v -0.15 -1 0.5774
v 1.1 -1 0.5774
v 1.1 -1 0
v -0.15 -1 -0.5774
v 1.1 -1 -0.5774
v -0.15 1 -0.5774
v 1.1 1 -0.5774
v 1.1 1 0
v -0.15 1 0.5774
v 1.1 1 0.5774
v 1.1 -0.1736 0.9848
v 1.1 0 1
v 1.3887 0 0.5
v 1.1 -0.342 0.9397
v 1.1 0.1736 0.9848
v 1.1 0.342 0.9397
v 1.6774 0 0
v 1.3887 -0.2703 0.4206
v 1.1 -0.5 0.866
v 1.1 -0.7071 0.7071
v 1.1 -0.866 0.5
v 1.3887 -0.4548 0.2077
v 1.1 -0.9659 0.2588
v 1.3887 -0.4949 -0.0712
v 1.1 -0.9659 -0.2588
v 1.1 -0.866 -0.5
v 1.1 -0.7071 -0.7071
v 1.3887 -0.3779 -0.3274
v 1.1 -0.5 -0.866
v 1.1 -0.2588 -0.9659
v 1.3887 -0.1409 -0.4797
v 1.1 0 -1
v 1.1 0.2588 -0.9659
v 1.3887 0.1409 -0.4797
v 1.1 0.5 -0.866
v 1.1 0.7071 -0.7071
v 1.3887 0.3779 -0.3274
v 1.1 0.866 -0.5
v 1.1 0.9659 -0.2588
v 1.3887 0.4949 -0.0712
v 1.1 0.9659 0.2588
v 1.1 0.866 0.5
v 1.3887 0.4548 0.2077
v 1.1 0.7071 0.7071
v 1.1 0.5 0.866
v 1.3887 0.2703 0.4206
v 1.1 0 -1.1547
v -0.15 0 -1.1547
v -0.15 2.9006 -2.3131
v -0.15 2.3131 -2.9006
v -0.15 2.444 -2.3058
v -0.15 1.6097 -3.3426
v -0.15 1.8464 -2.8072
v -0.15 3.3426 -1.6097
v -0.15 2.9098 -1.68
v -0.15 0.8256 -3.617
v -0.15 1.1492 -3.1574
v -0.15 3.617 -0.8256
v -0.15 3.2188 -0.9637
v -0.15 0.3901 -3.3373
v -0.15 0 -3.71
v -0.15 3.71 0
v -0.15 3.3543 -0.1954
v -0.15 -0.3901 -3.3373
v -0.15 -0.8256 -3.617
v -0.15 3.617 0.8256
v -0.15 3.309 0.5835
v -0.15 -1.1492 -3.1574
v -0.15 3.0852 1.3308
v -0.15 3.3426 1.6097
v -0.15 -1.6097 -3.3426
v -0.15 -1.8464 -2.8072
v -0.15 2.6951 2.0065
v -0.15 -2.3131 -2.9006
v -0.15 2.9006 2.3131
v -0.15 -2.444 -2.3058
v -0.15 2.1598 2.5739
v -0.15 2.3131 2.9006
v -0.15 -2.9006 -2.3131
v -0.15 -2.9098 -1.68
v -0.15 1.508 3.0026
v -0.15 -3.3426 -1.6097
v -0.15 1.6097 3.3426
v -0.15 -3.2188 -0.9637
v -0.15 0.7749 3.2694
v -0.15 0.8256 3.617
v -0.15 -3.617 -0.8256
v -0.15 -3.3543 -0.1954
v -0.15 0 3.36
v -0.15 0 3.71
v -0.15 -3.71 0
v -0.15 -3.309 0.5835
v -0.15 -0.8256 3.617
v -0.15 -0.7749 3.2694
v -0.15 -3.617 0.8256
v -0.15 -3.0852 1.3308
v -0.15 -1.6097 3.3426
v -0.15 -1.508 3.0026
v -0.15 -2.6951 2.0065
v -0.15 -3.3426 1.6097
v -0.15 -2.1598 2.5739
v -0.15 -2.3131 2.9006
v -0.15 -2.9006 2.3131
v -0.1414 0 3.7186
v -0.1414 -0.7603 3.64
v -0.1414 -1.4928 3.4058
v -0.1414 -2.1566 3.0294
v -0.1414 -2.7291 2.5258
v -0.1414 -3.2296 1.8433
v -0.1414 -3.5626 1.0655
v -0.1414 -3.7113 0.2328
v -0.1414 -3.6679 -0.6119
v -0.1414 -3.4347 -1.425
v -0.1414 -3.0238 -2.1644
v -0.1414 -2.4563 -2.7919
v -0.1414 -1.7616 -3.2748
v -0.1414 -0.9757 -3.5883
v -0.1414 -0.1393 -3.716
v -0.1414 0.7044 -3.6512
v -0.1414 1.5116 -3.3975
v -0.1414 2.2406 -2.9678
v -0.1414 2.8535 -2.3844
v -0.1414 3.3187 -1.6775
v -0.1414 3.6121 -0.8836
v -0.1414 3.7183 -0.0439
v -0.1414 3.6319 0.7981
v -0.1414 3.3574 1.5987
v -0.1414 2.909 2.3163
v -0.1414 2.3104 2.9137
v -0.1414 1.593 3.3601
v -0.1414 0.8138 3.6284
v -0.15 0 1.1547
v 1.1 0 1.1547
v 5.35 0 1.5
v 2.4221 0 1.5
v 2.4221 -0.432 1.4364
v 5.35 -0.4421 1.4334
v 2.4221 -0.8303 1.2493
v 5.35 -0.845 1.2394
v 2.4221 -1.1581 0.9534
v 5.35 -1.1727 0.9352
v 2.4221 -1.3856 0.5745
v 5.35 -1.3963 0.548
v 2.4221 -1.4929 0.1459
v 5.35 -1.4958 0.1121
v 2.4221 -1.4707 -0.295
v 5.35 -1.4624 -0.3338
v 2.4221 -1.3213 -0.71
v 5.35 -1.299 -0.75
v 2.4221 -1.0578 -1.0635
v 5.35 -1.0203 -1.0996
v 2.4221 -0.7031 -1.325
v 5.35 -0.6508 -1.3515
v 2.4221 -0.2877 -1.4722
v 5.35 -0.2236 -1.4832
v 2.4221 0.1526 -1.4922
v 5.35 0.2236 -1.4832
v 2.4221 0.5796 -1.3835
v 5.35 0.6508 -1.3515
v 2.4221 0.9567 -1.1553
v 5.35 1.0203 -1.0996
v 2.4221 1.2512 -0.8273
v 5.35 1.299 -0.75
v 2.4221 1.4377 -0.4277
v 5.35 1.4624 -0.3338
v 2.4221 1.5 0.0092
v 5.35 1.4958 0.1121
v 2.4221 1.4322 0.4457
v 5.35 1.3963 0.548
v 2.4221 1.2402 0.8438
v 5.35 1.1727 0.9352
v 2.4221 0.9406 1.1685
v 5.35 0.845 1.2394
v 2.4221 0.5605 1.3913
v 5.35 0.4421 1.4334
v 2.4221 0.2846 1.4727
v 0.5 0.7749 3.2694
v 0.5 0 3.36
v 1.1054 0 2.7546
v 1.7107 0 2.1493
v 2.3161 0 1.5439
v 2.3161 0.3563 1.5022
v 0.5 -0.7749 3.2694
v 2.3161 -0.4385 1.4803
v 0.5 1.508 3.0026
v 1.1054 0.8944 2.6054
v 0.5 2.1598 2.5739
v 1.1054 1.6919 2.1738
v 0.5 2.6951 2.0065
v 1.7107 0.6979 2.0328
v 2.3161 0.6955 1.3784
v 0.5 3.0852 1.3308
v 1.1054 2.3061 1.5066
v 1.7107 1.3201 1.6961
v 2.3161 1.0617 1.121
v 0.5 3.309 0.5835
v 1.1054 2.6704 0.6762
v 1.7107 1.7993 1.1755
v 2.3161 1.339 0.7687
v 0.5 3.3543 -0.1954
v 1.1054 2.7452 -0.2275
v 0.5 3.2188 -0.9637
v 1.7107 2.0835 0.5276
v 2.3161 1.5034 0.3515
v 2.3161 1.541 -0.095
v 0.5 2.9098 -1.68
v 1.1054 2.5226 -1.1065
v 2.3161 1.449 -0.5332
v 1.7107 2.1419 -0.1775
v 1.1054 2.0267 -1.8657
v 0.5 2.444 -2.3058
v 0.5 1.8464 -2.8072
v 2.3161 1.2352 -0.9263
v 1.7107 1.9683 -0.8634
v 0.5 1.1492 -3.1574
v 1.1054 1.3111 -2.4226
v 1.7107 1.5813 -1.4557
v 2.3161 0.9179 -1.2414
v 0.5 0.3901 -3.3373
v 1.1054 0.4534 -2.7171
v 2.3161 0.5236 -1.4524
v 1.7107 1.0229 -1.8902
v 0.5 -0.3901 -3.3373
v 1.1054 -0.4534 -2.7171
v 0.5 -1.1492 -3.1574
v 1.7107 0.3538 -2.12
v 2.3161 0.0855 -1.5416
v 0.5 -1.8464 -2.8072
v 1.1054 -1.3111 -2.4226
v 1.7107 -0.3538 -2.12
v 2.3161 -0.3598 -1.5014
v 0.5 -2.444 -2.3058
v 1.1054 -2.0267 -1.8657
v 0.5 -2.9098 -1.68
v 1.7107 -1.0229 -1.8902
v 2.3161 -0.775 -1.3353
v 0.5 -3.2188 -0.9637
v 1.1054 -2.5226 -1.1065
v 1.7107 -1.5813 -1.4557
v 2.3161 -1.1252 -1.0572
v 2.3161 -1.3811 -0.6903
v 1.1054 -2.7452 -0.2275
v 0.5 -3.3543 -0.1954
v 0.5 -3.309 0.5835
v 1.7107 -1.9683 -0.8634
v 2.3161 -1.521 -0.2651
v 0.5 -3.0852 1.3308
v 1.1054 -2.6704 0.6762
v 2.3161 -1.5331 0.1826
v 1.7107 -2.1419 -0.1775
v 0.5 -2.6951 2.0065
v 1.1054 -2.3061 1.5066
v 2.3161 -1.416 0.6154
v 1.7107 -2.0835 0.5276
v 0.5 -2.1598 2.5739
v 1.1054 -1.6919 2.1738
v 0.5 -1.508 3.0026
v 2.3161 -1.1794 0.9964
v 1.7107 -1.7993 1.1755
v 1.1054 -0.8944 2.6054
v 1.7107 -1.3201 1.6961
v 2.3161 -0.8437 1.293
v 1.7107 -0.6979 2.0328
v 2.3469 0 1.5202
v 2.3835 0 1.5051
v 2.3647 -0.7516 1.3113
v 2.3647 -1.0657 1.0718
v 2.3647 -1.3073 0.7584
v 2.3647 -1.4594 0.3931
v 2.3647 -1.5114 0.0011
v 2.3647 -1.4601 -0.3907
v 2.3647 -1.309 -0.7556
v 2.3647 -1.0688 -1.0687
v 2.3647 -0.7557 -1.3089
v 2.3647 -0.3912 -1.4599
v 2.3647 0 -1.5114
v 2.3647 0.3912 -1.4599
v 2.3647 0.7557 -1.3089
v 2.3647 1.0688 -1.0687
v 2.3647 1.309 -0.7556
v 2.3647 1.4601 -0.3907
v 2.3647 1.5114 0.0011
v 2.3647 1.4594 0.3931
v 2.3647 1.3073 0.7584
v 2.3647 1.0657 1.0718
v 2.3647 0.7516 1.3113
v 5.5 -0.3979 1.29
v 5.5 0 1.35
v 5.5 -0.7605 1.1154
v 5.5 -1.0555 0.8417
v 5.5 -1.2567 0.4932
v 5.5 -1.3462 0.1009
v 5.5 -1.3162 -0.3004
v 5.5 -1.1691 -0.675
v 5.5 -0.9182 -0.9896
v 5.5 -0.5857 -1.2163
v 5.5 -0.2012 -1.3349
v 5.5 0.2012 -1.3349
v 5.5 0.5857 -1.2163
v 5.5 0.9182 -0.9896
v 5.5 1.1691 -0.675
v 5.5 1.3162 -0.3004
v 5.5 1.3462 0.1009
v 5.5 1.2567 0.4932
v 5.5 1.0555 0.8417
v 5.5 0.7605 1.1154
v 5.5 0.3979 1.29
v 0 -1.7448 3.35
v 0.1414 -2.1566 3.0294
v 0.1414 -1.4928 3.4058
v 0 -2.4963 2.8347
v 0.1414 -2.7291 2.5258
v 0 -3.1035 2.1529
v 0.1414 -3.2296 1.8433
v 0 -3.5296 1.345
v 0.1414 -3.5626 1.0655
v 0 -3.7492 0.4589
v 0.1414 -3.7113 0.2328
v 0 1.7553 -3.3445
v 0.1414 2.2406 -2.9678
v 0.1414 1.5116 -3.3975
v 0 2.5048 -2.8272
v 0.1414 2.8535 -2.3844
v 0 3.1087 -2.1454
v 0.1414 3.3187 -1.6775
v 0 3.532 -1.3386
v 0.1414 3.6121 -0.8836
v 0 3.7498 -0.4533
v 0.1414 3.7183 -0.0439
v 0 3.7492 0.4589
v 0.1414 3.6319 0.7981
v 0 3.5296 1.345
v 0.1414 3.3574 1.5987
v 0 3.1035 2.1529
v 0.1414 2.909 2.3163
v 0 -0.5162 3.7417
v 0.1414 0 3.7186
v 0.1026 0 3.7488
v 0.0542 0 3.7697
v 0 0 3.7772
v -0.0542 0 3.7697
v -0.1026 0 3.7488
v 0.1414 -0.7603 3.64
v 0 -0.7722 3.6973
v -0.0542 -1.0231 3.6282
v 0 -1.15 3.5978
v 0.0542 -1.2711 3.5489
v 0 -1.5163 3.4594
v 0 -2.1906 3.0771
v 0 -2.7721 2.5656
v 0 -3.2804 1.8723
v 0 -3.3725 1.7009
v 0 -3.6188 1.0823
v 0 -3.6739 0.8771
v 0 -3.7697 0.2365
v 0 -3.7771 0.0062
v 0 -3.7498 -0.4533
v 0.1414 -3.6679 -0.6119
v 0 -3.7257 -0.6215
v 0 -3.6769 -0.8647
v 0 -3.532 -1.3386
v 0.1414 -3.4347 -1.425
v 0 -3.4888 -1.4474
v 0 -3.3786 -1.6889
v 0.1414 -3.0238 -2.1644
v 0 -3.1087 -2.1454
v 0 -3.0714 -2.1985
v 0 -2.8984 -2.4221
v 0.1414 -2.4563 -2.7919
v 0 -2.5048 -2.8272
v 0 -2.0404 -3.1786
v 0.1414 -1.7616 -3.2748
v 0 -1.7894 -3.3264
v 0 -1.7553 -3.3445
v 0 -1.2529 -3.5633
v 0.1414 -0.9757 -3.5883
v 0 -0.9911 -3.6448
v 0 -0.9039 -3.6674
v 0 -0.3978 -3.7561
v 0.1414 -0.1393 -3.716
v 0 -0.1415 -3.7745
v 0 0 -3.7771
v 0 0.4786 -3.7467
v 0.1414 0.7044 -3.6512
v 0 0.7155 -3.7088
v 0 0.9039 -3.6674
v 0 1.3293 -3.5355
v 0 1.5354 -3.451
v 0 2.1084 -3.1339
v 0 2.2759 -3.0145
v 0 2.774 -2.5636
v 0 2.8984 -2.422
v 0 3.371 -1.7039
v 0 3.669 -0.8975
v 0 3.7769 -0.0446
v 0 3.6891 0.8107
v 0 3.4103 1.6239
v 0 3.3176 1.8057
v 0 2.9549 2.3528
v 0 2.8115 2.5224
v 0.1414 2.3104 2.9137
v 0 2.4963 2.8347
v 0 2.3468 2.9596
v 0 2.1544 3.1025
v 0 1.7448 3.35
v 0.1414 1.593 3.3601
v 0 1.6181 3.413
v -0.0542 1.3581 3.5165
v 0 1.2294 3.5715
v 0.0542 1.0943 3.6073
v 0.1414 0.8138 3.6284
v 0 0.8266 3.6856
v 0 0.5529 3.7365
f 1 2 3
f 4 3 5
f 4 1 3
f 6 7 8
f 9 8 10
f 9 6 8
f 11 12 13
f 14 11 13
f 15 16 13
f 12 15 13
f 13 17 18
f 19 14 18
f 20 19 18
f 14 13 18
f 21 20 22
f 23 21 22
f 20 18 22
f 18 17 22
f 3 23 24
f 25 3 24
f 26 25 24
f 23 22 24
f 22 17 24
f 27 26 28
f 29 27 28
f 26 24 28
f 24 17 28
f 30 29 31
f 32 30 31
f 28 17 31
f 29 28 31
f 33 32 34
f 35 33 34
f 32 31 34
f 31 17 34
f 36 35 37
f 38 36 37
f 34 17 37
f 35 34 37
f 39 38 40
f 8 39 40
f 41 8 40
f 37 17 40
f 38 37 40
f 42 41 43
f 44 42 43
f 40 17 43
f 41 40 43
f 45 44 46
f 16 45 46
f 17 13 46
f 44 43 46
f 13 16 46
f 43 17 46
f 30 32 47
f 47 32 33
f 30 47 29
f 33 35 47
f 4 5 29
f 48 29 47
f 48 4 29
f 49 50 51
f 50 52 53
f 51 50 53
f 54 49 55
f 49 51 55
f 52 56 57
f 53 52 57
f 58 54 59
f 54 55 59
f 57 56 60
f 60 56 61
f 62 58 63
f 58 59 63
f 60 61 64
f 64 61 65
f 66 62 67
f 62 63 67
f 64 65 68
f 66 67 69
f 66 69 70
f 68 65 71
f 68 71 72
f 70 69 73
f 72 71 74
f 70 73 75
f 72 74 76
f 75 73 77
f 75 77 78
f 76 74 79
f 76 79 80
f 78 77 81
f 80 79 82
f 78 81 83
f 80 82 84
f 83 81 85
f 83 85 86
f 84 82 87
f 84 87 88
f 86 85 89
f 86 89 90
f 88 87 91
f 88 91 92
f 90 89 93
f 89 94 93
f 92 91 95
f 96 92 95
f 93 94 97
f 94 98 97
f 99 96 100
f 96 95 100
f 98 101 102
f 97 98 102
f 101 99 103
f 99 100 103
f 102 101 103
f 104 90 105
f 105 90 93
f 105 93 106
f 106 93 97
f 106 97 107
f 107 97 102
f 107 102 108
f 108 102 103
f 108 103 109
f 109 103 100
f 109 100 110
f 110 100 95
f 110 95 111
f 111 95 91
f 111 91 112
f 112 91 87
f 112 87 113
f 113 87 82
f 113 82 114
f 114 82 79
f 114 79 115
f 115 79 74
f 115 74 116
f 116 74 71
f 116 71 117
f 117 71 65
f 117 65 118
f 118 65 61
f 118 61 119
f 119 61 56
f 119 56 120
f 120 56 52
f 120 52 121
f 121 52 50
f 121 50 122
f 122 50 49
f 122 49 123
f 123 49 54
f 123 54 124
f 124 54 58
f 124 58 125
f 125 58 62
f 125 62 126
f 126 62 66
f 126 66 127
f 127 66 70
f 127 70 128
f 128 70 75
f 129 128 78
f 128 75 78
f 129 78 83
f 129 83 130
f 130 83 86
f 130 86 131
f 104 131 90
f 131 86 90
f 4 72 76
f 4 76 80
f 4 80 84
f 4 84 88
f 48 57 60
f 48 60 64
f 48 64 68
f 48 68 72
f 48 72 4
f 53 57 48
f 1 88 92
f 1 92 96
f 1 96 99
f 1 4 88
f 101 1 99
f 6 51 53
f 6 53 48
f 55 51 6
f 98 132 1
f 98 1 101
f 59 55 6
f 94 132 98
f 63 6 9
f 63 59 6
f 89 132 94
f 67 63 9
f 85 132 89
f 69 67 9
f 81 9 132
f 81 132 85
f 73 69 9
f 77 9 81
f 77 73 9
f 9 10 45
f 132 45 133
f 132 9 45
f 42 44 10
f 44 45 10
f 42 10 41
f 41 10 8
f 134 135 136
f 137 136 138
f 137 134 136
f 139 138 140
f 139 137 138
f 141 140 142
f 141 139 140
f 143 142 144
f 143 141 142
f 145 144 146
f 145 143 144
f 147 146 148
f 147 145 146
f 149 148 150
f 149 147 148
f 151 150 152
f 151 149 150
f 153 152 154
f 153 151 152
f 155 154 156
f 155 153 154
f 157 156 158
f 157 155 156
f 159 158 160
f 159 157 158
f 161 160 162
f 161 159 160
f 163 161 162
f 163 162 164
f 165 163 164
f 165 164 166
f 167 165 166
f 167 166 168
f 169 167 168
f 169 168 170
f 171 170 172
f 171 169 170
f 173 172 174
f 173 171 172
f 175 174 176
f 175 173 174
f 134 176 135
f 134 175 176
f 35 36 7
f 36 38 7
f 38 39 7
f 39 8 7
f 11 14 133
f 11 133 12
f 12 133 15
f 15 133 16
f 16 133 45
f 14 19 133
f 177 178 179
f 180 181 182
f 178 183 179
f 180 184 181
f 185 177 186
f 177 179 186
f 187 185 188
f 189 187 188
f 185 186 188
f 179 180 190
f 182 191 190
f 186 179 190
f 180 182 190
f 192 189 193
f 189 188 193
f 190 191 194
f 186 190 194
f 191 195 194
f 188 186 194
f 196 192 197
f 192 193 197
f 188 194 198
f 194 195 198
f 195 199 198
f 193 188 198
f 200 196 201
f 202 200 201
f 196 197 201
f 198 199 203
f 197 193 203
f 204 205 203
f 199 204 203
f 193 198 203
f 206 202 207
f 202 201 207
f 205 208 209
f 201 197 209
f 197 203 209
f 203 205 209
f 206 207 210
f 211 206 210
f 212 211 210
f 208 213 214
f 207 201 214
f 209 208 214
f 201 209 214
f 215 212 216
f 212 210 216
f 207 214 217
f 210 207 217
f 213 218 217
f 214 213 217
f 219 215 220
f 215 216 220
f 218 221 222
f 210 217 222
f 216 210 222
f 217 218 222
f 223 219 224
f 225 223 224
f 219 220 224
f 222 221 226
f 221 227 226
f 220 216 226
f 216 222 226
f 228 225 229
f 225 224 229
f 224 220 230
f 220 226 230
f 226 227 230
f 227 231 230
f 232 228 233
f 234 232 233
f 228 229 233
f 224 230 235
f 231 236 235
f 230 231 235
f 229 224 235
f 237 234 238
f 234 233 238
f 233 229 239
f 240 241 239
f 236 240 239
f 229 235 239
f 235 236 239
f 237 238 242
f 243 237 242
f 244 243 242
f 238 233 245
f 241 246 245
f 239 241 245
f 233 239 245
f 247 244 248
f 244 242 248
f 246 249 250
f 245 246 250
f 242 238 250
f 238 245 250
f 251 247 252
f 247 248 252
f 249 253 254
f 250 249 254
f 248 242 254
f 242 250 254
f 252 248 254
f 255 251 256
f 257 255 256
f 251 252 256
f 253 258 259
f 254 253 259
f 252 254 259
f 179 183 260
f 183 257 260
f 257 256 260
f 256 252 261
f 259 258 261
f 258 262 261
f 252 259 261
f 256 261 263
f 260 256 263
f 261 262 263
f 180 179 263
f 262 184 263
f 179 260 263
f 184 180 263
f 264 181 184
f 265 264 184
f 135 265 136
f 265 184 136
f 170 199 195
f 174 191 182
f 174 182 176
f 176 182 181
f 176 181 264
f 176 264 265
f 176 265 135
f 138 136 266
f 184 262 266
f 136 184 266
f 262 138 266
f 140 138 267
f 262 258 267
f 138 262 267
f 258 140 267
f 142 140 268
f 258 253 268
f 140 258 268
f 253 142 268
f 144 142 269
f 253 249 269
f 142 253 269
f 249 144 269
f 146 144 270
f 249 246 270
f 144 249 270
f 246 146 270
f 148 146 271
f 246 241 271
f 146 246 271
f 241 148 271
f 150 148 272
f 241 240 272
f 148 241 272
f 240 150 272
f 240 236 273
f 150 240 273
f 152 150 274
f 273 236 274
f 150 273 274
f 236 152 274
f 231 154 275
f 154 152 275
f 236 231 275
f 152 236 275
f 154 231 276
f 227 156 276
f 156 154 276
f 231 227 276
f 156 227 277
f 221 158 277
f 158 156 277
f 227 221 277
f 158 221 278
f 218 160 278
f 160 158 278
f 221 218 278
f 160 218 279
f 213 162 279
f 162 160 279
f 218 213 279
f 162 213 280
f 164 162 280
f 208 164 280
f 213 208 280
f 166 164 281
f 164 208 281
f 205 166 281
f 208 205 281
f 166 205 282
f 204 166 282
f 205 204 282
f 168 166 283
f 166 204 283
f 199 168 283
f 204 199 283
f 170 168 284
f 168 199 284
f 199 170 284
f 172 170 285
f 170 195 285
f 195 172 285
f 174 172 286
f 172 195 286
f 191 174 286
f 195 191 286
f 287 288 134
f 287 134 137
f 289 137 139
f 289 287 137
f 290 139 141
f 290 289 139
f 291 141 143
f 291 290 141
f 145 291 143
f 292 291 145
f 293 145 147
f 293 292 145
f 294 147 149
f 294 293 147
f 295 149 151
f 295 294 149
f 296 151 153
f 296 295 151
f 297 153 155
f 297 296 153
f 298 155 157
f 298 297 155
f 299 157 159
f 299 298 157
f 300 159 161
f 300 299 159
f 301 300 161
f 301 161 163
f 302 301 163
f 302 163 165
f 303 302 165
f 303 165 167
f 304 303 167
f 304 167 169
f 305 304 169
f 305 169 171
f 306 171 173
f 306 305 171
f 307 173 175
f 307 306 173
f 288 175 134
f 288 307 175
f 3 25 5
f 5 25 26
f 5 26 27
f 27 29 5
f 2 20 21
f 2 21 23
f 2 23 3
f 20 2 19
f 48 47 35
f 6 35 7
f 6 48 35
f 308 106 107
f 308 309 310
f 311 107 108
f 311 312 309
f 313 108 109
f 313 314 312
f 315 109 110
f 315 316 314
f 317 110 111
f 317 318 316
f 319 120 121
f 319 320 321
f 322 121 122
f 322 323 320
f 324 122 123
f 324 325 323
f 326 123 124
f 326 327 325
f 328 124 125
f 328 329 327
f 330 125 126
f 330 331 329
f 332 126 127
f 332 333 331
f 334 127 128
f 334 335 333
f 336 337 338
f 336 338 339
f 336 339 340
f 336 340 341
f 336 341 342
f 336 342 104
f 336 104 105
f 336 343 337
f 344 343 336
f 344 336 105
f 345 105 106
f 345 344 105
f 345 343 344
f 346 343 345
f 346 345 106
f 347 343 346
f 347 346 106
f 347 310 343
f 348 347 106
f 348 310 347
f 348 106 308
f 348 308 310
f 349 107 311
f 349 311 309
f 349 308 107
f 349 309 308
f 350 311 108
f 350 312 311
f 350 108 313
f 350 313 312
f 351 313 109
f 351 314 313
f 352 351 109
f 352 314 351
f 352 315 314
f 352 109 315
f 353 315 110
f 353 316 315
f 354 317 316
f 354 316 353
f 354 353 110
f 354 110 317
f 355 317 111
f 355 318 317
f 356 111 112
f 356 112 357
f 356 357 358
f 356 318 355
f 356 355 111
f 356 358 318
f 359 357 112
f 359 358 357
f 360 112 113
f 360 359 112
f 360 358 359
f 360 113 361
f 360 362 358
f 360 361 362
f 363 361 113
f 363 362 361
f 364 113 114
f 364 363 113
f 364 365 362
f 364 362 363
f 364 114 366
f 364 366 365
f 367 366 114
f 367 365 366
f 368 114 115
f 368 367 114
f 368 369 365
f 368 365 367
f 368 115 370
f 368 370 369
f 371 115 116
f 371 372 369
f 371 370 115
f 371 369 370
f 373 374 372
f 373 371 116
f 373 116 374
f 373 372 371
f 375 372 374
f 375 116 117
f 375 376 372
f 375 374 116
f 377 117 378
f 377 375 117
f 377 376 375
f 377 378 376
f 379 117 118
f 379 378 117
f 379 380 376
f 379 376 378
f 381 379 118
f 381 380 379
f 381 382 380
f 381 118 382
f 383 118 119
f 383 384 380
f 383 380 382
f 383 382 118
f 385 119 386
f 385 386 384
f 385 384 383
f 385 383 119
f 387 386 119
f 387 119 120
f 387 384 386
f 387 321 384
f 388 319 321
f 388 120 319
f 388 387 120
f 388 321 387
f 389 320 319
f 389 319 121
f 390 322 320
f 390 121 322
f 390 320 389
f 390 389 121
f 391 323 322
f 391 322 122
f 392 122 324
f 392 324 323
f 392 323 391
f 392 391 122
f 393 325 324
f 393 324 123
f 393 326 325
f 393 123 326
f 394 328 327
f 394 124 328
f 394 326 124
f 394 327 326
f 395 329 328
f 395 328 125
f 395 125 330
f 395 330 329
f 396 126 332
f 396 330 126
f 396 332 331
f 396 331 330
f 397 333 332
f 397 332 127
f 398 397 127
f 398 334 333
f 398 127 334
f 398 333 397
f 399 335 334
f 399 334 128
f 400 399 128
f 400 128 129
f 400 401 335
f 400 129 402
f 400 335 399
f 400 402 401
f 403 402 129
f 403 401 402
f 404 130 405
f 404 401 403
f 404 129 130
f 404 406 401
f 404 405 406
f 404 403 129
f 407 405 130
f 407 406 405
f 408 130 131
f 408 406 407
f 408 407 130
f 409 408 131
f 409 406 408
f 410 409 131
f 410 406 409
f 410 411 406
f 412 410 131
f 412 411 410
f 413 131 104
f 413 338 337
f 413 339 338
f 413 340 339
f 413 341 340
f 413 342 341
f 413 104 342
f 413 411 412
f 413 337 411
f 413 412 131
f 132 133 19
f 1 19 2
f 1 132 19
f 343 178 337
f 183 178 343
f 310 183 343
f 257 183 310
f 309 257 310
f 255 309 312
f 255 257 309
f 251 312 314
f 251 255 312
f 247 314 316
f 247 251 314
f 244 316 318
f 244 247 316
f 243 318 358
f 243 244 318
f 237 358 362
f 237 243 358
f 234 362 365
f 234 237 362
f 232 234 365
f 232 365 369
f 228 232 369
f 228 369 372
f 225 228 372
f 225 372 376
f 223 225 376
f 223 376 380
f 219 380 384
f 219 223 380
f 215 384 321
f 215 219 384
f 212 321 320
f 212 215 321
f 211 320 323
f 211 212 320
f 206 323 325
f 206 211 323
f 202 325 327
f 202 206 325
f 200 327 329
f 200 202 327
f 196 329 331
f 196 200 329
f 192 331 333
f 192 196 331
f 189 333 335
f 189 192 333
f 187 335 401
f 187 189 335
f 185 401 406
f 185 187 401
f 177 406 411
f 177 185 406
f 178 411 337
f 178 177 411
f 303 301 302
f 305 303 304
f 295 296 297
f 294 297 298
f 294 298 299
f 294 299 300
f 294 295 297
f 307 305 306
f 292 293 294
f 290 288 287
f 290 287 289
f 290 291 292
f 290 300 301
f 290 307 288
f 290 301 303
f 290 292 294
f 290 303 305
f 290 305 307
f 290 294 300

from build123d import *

# Parameters (mm, degrees)
HEXAGONSOCKET_DEPTH = 1.1
CHAMFER_2_SIZE      = 0.2705
SKETCH_1_R          = 3.36
EXTRUDE_4_DEPTH     = 0.5
EXTRUDE_START       = 0.15
SKETCH_8_R          = 3.36
EXTRUDE_6_DEPTH     = 0.15
FILLET_5_R          = 0.2
CUT_EXTRUDE_START   = 3.14
SKETCH_6_R          = 1.5
CUT_EXTRUDE_1_DEPTH = 5.628101593
FILLET_6_R          = 0.15
CHAMFER_1_SIZE      = 0.15


with BuildPart() as part:
    # Sketch1 → Base (revolve)
    with BuildSketch(Plane.XY, mode=Mode.PRIVATE) as base_sk:
        Polygon((0, 0), (0, 3.36), (1.86, 1.5), (8, 1.5), (8, 0), align=None)
    revolve(base_sk.sketch.rotate(Axis((-0.587069181, 0, 0), (1, 0, 0)), 90), axis=Axis((-0.587069181, 0, 0), (1, 0, 0)))

    # Sketch2 → HexagonSocket (cut)
    with BuildSketch(Plane(origin=(0, 0, 0), x_dir=(0, 0, -1), z_dir=(1, 0, 0))):
        Polygon((1.154700538, 0), (0.577350269, 1), (-0.577350269, 1), (-1.154700538, 0), (-0.577350269, -1), (0.577350269, -1), align=None)
    extrude(amount=HEXAGONSOCKET_DEPTH, mode=Mode.SUBTRACT)

    # Sketch3 → Cut-Revolve1 (revolve, cut)
    with BuildSketch(Plane.XY, mode=Mode.PRIVATE) as cut_revolve1_sk:
        Polygon((1.1, 1), (1.677350269, 0), (1.1, 0), align=None)
    revolve(cut_revolve1_sk.sketch.rotate(Axis((-0.439109555, 0, 0), (1, 0, 0)), 90), axis=Axis((-0.439109555, 0, 0), (1, 0, 0)), mode=Mode.SUBTRACT)

    # Chamfer 2
    chamfer_2_edges = [part.edges().sort_by_distance(p)[0] for p in [
        (8, 0, -1.5),
    ]]
    chamfer(chamfer_2_edges, length=CHAMFER_2_SIZE)

    # 草图1 → 凸台-拉伸4 (add)
    with BuildSketch(Plane.ZY):
        Circle(SKETCH_1_R)
        Polygon((0.577350269, -1), (-0.577350269, -1), (-1.154700538, 0), (-0.577350269, 1), (0.577350269, 1), (1.154700538, 0), align=None, mode=Mode.SUBTRACT)
    extrude(amount=-EXTRUDE_4_DEPTH)

    # 草图5 → 旋转7 (revolve)
    with BuildSketch(Plane(origin=(0, 0, 0), x_dir=(1, 0, 0), z_dir=(0, 0.5000000000000003, 0.8660254037844386)), mode=Mode.PRIVATE) as revolve_7_sk:
        Polygon((2.632985321, -0.645763152), (0.5, -2.778748473), (0.5, -3.36), (2.632985321, -1.227014679), align=None)
    revolve(revolve_7_sk.sketch.rotate(Axis((1.86, 0, 0), (-1, 0, 0)), 60), axis=Axis((1.86, 0, 0), (-1, 0, 0)))

    # 草图8 → 凸台-拉伸6 (add)
    with BuildSketch(Plane.ZY.offset(EXTRUDE_START)):
        Circle(SKETCH_8_R)
        Polygon((0.577350269, -1), (-0.577350269, -1), (-1.154700538, 0), (-0.577350269, 1), (0.577350269, 1), (1.154700538, 0), align=None, mode=Mode.SUBTRACT)
    extrude(amount=-EXTRUDE_6_DEPTH)

    # 草图11 → 旋转8 (revolve)
    with BuildSketch(Plane(origin=(0, 0, 0), x_dir=(1, 0, 0), z_dir=(0, 0.5000000000000003, 0.8660254037844386)), mode=Mode.PRIVATE) as revolve_8_sk:
        Polygon((0.5, -3.36), (0.217401845, -3.642598155), (0, -3.86), (-0.15, -3.71), (-0.15, -3.36), align=None)
    revolve(revolve_8_sk.sketch.rotate(Axis((-0.15, 0, 0), (1, 0, 0)), 300), axis=Axis((-0.15, 0, 0), (1, 0, 0)))

    # 圆角5
    fillet_5_edges = [part.edges().sort_by_distance(p)[0] for p in [
        (0, 0, -3.86),
    ]]
    fillet(fillet_5_edges, radius=FILLET_5_R)

    # 草图6 → 切除-拉伸1 (cut, through all)
    with BuildSketch(Plane(origin=(2.36, 0, 0), x_dir=(0, 0, -1), z_dir=(1, 0, 0)).offset(CUT_EXTRUDE_START)):
        with Locations(Location((0, 0, 0), (0, 0, 180))):
            Circle(SKETCH_6_R)
    extrude(amount=CUT_EXTRUDE_1_DEPTH, mode=Mode.SUBTRACT)

    # 圆角6
    fillet_6_edges = [part.edges().sort_by_distance(p)[0] for p in [
        (2.36, 0, -1.5),
    ]]
    fillet(fillet_6_edges, radius=FILLET_6_R)

    # 倒角1
    chamfer_1_edges = [part.edges().sort_by_distance(p)[0] for p in [
        (5.5, 0, -1.5),
    ]]
    chamfer(chamfer_1_edges, length=CHAMFER_1_SIZE)


solid = part.part
